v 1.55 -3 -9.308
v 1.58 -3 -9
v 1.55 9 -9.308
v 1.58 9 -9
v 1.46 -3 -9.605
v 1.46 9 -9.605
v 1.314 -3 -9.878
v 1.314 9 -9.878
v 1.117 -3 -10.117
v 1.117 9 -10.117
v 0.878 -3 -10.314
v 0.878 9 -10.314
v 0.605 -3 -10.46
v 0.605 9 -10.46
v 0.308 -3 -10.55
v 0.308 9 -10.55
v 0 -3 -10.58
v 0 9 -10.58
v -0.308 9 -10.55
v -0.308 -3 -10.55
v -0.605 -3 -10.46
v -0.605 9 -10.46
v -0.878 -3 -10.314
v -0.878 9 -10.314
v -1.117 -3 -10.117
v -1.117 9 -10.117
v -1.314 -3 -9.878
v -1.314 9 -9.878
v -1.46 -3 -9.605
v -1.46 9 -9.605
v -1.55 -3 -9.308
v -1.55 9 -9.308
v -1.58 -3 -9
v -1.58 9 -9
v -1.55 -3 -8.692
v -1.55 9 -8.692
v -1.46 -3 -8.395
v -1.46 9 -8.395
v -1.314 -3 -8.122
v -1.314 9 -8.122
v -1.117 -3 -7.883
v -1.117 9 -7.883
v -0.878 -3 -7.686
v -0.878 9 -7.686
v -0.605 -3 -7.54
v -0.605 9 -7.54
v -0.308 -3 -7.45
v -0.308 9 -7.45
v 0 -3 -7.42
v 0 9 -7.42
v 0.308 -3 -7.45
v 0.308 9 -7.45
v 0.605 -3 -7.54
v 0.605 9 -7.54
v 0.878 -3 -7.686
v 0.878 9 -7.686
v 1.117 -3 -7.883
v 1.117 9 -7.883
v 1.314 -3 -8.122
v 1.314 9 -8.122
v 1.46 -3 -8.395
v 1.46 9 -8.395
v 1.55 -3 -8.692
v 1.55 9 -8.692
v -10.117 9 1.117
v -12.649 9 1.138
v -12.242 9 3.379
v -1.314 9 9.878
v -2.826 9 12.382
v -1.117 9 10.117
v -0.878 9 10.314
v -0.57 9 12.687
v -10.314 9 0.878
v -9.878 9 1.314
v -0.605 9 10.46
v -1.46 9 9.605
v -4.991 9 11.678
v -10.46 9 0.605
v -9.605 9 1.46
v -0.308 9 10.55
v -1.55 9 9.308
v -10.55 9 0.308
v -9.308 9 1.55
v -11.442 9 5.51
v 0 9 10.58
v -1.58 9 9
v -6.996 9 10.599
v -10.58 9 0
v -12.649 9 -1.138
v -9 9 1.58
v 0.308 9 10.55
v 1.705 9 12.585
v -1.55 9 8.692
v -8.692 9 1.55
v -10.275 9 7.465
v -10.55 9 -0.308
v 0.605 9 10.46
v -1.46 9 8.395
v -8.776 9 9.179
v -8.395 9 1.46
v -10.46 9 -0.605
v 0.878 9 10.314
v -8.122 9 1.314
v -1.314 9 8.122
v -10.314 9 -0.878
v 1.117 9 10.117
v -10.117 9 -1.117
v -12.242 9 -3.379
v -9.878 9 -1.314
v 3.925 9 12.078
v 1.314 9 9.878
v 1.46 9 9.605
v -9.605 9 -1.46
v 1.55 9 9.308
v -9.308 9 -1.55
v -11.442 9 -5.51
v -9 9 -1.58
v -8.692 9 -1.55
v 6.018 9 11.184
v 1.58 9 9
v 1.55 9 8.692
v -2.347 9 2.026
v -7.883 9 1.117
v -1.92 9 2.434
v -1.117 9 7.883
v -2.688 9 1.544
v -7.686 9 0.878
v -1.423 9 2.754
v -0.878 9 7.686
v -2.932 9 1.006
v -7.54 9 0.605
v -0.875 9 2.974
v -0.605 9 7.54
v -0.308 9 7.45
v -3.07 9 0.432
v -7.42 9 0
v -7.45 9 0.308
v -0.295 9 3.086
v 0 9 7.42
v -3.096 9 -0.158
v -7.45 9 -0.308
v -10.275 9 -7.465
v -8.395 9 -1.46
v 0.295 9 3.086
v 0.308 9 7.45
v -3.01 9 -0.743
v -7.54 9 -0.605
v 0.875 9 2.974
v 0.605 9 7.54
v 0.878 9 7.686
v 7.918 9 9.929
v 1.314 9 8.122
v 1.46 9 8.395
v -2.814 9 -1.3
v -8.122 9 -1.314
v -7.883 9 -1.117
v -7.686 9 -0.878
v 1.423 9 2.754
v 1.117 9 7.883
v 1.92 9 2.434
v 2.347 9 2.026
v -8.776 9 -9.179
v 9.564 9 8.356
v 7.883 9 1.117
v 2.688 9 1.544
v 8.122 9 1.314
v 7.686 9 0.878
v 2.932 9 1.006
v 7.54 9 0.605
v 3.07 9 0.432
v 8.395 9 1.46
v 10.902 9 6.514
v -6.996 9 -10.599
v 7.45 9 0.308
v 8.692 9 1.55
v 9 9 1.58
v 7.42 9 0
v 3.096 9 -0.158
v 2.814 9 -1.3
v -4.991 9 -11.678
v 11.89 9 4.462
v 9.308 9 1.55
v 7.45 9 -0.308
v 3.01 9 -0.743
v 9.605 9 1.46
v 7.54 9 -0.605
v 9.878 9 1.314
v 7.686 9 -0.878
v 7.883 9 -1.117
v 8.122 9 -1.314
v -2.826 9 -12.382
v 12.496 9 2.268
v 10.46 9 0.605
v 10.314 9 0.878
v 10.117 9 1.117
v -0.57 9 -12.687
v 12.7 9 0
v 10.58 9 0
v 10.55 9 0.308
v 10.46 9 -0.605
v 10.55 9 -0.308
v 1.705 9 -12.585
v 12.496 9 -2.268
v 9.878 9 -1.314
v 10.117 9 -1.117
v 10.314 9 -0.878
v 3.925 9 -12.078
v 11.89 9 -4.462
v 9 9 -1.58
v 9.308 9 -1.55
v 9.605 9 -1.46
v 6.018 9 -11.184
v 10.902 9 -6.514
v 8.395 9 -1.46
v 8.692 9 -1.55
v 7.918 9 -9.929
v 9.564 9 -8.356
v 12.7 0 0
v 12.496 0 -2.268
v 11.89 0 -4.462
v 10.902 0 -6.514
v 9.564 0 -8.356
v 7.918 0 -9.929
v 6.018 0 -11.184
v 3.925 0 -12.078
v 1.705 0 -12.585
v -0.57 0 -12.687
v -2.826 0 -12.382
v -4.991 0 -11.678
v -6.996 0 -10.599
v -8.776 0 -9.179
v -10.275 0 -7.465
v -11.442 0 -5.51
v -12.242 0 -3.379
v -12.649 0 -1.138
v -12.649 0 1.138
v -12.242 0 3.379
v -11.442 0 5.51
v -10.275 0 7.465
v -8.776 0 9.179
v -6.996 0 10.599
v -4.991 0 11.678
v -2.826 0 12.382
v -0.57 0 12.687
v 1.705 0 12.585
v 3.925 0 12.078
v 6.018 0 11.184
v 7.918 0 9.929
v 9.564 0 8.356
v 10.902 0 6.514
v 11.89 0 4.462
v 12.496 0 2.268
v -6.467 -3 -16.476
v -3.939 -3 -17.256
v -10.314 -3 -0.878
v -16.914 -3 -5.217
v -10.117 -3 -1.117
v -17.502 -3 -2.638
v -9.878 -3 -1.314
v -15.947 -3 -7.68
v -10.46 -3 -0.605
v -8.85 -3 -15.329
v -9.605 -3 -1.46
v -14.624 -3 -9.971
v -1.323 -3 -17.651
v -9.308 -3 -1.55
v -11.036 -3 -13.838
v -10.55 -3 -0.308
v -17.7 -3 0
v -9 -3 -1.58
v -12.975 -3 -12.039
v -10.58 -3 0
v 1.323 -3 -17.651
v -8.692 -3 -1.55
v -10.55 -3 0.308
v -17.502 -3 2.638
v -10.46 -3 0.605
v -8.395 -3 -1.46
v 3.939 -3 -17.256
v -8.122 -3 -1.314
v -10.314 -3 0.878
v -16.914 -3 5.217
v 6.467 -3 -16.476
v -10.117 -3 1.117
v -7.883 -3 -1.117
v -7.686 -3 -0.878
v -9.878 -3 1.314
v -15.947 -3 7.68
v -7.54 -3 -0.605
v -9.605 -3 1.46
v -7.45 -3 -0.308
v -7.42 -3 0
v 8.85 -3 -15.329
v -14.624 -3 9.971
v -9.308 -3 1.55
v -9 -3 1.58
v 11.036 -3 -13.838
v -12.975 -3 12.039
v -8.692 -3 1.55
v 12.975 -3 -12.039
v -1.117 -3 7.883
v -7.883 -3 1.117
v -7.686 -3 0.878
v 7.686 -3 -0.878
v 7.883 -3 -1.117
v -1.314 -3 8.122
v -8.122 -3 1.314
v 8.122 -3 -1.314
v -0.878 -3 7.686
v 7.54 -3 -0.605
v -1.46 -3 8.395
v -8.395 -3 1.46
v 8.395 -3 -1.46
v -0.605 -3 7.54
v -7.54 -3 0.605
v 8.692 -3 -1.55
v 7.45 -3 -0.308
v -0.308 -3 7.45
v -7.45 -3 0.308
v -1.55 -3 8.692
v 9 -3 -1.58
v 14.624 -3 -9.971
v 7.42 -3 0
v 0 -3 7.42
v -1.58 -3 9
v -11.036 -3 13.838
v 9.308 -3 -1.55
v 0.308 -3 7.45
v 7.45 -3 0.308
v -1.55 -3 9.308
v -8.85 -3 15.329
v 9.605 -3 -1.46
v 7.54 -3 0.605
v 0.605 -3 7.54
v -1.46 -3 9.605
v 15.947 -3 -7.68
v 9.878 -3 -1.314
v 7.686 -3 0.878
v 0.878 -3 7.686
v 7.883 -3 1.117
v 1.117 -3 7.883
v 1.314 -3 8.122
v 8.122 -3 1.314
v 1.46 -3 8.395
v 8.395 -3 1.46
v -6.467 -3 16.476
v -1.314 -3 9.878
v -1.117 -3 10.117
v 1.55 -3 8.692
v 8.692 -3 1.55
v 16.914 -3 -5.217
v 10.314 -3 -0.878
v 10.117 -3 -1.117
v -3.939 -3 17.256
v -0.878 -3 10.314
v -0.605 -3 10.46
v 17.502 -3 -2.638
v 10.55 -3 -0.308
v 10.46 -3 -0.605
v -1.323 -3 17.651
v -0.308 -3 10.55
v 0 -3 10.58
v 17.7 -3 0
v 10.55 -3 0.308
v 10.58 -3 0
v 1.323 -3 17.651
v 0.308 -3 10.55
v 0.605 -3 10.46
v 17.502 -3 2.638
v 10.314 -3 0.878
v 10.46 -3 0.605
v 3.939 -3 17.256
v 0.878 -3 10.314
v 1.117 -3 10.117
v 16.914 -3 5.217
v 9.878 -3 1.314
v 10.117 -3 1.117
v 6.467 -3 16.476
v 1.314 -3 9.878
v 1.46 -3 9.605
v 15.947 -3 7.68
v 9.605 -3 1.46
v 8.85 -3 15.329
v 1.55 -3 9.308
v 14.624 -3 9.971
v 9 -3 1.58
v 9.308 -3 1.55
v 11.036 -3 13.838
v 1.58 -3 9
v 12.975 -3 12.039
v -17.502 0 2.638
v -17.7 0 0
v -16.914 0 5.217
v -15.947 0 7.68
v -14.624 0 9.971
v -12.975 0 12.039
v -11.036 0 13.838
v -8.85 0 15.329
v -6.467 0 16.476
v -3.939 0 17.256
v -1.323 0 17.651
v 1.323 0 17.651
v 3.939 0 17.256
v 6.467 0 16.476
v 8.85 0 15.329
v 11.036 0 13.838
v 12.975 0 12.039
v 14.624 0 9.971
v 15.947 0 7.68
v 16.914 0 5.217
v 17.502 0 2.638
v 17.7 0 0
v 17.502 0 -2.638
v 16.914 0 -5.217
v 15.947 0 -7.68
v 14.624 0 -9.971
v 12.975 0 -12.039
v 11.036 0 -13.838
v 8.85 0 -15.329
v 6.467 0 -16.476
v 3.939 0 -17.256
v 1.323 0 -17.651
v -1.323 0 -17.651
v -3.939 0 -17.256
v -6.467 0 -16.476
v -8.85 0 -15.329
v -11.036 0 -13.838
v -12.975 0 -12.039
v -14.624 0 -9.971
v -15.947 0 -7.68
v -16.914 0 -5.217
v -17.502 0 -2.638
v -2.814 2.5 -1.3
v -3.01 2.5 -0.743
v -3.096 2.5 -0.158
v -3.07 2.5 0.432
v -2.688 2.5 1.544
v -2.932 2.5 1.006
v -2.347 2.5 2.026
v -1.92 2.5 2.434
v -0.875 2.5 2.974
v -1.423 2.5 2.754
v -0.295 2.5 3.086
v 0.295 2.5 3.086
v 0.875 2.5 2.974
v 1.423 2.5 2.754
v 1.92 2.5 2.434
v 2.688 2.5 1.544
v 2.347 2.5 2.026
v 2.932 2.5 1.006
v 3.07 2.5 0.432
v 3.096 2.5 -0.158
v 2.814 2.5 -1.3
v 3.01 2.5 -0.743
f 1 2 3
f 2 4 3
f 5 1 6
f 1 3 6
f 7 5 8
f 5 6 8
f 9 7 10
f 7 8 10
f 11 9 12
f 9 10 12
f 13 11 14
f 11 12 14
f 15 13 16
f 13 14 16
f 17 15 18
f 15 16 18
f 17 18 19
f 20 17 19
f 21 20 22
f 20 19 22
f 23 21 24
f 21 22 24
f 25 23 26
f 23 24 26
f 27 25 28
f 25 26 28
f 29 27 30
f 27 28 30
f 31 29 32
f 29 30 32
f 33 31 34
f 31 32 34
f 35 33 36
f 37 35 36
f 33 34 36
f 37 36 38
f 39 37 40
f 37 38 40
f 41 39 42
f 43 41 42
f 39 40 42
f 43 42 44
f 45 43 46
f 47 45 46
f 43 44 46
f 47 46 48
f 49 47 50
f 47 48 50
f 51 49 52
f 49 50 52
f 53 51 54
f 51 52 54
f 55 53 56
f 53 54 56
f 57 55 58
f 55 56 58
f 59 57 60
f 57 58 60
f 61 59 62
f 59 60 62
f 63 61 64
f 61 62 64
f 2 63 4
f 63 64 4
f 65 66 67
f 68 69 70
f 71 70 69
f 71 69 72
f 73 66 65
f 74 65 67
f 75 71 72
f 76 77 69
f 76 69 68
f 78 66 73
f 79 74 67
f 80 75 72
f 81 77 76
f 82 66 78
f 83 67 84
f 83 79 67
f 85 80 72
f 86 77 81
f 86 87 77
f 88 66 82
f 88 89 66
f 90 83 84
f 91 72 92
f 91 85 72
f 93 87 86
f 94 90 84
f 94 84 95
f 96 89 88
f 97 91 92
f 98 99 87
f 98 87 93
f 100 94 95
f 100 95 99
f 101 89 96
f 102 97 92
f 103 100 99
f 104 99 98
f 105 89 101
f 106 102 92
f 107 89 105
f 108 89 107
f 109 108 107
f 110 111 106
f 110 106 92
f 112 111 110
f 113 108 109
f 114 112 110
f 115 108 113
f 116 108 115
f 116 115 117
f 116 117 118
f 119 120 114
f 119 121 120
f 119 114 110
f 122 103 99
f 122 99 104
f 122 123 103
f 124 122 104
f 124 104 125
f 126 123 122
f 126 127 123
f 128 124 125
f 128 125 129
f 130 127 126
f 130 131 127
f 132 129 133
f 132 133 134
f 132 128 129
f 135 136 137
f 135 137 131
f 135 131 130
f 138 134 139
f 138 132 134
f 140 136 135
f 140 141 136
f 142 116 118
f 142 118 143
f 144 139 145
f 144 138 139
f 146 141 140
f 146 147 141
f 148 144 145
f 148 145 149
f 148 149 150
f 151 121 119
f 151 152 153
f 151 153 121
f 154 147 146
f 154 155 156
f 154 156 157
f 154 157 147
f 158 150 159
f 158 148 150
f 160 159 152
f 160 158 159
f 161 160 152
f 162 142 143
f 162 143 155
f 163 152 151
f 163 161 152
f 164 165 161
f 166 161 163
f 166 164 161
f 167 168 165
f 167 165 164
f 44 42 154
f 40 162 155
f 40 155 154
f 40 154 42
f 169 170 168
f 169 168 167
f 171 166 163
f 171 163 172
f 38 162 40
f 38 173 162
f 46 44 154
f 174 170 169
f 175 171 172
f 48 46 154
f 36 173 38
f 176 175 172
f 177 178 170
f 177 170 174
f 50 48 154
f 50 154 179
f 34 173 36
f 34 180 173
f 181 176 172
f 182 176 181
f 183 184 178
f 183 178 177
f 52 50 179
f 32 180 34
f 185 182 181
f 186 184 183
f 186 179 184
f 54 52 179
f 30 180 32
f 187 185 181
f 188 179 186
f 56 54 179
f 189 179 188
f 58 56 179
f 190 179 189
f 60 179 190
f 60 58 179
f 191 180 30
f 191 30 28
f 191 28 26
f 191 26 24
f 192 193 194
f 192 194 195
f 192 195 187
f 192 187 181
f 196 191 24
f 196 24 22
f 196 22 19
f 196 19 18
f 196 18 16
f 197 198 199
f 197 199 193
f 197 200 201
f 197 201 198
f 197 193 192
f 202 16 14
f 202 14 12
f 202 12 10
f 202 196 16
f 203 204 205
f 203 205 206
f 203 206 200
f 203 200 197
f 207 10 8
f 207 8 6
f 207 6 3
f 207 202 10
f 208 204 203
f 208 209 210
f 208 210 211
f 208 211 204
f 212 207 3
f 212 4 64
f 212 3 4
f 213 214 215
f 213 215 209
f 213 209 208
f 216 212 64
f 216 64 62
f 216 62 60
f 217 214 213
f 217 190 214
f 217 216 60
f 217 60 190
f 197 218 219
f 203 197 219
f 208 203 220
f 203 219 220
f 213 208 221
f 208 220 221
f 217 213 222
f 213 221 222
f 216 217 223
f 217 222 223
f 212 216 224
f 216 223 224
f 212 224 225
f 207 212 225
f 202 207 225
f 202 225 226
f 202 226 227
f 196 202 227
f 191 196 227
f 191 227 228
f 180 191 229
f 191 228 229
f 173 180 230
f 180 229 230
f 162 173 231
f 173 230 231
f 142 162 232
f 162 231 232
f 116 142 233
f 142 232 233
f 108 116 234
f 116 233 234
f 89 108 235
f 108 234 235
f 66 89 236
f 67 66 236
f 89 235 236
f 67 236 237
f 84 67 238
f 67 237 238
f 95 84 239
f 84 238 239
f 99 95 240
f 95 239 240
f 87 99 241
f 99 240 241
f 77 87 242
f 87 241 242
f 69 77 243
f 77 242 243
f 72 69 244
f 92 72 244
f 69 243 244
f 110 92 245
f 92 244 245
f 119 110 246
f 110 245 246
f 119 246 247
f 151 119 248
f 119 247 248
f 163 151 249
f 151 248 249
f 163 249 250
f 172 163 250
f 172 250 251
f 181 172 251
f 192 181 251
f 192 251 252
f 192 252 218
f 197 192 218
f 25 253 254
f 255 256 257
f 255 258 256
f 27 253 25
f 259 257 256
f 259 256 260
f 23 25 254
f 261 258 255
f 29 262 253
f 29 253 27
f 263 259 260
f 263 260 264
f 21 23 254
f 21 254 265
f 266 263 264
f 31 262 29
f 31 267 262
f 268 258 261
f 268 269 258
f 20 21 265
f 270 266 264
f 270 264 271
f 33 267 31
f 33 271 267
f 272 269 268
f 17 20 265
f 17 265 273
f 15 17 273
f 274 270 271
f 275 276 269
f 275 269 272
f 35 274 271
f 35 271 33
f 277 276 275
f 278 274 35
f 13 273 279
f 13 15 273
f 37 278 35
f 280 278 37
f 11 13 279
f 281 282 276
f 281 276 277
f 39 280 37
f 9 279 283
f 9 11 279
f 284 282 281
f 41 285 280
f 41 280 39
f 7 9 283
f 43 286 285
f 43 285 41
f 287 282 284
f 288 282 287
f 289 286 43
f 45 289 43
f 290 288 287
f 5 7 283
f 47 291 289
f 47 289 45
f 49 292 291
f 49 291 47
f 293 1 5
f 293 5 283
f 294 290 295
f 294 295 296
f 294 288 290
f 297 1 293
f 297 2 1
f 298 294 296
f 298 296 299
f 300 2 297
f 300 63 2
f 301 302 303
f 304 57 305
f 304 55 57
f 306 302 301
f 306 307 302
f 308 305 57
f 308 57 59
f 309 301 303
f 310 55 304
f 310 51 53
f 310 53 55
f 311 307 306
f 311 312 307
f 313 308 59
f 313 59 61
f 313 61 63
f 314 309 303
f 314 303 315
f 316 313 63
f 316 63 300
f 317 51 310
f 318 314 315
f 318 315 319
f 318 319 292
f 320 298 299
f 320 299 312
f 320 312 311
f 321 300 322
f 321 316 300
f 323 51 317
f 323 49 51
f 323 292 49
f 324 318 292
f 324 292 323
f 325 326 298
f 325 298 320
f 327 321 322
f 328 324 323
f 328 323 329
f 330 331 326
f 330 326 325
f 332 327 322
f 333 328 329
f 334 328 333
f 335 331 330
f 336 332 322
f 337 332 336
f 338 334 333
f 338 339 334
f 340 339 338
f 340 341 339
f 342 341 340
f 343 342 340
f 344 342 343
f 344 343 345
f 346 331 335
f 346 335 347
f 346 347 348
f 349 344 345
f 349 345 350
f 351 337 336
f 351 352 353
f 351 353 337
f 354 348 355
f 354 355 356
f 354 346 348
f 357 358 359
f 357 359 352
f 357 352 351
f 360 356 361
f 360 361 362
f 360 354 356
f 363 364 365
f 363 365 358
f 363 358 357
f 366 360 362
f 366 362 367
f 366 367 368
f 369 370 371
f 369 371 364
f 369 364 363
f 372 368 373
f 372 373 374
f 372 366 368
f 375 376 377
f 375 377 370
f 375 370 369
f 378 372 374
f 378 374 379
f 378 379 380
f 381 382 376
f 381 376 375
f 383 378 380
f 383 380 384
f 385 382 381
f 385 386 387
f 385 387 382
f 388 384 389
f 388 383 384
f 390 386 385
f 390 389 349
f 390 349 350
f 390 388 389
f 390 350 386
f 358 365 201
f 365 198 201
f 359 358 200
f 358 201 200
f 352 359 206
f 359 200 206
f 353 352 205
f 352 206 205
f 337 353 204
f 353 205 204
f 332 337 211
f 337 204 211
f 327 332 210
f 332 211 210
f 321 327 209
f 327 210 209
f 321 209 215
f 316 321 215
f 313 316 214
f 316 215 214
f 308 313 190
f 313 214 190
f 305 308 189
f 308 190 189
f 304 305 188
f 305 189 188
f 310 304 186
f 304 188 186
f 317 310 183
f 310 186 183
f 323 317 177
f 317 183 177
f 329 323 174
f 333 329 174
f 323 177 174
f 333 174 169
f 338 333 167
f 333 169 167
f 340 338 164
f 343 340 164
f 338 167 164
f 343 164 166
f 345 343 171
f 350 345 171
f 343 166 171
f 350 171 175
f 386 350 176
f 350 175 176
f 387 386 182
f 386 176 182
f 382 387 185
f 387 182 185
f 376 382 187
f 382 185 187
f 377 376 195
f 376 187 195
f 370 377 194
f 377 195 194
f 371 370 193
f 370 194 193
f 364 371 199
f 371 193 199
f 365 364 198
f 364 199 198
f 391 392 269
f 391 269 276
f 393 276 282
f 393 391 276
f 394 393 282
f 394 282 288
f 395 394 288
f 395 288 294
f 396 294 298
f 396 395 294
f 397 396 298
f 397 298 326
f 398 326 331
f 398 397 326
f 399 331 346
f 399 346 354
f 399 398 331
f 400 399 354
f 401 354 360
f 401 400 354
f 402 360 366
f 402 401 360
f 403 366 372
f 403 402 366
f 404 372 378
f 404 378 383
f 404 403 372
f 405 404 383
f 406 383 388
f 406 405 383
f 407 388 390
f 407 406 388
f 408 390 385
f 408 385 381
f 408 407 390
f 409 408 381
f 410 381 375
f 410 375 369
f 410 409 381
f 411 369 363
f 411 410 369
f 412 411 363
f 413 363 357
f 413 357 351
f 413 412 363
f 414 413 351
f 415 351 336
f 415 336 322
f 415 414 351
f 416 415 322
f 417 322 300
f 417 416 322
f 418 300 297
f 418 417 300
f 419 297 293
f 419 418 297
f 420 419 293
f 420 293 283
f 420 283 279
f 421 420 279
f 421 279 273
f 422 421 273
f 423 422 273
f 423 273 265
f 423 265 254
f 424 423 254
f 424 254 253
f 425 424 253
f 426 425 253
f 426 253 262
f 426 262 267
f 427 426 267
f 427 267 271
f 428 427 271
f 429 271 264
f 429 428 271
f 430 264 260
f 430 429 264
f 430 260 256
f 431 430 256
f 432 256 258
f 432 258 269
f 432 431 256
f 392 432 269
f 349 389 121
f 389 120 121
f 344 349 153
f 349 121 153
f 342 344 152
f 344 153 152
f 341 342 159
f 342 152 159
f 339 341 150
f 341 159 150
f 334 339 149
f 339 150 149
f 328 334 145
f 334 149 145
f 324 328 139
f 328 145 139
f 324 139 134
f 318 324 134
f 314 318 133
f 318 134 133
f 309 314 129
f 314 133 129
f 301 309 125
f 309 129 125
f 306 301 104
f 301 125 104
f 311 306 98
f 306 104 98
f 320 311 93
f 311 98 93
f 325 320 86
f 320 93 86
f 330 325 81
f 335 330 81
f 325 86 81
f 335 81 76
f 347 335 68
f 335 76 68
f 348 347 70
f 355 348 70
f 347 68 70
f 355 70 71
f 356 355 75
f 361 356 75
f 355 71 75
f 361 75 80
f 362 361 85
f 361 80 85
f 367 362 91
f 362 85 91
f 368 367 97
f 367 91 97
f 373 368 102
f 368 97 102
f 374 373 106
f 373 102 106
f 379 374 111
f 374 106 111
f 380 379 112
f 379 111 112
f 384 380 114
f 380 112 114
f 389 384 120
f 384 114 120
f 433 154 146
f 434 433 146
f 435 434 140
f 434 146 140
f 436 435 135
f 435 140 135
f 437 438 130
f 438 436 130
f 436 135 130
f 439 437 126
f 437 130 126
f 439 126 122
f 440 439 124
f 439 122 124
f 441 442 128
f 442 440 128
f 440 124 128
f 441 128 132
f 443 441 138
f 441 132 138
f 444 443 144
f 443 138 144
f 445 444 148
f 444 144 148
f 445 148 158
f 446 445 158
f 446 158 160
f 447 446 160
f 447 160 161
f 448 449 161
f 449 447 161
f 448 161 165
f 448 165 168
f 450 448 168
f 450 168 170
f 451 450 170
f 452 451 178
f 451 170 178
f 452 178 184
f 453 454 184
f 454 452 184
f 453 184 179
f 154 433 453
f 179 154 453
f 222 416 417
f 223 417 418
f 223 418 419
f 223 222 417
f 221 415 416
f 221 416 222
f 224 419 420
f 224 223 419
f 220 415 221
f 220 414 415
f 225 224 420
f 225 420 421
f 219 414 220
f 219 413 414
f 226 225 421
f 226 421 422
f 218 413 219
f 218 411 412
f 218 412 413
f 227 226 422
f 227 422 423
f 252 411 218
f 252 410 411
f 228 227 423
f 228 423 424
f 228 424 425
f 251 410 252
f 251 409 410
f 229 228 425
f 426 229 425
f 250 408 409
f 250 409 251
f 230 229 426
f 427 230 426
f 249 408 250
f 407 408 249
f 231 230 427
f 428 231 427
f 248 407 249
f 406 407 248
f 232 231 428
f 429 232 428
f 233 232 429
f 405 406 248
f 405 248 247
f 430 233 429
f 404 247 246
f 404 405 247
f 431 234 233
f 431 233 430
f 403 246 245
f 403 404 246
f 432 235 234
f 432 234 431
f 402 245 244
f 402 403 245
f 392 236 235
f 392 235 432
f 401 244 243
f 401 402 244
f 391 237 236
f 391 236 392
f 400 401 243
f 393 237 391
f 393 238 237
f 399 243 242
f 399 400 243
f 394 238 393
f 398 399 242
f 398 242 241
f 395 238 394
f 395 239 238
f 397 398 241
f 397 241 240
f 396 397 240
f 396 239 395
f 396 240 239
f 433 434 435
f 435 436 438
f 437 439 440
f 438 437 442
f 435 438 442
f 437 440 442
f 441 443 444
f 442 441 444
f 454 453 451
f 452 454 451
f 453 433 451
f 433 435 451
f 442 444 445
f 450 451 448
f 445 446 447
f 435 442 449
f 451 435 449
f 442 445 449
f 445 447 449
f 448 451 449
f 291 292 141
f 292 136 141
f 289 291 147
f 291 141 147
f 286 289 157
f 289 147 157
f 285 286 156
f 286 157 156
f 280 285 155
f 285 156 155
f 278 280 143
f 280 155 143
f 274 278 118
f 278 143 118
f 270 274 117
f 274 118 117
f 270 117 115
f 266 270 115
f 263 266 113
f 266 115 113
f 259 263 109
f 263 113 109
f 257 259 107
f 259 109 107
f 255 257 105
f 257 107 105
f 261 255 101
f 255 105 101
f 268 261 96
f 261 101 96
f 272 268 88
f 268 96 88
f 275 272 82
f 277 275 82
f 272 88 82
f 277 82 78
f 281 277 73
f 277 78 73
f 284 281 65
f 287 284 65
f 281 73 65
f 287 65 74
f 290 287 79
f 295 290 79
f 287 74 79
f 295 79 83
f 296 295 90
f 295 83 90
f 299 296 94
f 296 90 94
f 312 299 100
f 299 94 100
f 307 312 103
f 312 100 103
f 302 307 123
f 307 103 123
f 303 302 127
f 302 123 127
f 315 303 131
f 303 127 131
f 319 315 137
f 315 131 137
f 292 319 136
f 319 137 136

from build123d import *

# Parameters (mm, degrees)
SKETCH1_R               = 12.7
BOSS_EXTRUDE1_DEPTH     = 9
SKETCH2_R               = 17.7
BOSS_EXTRUDE2_DEPTH     = 3
SKETCH3_R               = 3.1
SKETCH3_R_2             = 1.58
CUT_EXTRUDE1_DEPTH      = 10
CUT_EXTRUDE1_DEPTH_BACK = 4
SKETCH4_R               = 3.1
BOSS_EXTRUDE3_DEPTH     = 5.5
SKETCH5_W               = 6.2
SKETCH5_H               = 1.8
BOSS_EXTRUDE4_DEPTH     = 6.5


with BuildPart() as part:
    # Sketch1 → Boss-Extrude1 (new body)
    with BuildSketch(Plane(origin=(0, 0, 0), x_dir=(1, 0, 0), z_dir=(0, 1, 0))):
        Circle(SKETCH1_R)
    extrude(amount=BOSS_EXTRUDE1_DEPTH)

    # Sketch2 → Boss-Extrude2 (add)
    with BuildSketch(Plane(origin=(0, 0, 0), x_dir=(-1, 0, 0), z_dir=(0, 1, 0))):
        Circle(SKETCH2_R)
    extrude(amount=-BOSS_EXTRUDE2_DEPTH)

    # Sketch3 → Cut-Extrude1 (cut, two sides)
    with BuildSketch(Plane(origin=(0, 0, 0), x_dir=(1, 0, 0), z_dir=(0, 1, 0))) as cut_extrude1_sk:
        Circle(SKETCH3_R)
        with Locations((-9, 0)):
            Circle(SKETCH3_R_2)
        with Locations((9, 0)):
            Circle(SKETCH3_R_2)
        with Locations((0, 9)):
            Circle(SKETCH3_R_2)
        with Locations((0, -9)):
            Circle(SKETCH3_R_2)
    extrude(amount=CUT_EXTRUDE1_DEPTH, mode=Mode.SUBTRACT)
    extrude(cut_extrude1_sk.sketch, amount=-CUT_EXTRUDE1_DEPTH_BACK, mode=Mode.SUBTRACT)

    # Sketch4 → Boss-Extrude3 (add)
    with BuildSketch(Plane.XZ.offset(3)):
        Circle(SKETCH4_R)
    extrude(amount=-BOSS_EXTRUDE3_DEPTH)

    # Sketch5 → Boss-Extrude4 (add)
    with BuildSketch(Plane(origin=(0, 9, 0), x_dir=(1, 0, 0), z_dir=(0, 1, 0))):
        with Locations((0, 2.2)):
            Rectangle(SKETCH5_W, SKETCH5_H)
    extrude(amount=-BOSS_EXTRUDE4_DEPTH)


solid = part.part
